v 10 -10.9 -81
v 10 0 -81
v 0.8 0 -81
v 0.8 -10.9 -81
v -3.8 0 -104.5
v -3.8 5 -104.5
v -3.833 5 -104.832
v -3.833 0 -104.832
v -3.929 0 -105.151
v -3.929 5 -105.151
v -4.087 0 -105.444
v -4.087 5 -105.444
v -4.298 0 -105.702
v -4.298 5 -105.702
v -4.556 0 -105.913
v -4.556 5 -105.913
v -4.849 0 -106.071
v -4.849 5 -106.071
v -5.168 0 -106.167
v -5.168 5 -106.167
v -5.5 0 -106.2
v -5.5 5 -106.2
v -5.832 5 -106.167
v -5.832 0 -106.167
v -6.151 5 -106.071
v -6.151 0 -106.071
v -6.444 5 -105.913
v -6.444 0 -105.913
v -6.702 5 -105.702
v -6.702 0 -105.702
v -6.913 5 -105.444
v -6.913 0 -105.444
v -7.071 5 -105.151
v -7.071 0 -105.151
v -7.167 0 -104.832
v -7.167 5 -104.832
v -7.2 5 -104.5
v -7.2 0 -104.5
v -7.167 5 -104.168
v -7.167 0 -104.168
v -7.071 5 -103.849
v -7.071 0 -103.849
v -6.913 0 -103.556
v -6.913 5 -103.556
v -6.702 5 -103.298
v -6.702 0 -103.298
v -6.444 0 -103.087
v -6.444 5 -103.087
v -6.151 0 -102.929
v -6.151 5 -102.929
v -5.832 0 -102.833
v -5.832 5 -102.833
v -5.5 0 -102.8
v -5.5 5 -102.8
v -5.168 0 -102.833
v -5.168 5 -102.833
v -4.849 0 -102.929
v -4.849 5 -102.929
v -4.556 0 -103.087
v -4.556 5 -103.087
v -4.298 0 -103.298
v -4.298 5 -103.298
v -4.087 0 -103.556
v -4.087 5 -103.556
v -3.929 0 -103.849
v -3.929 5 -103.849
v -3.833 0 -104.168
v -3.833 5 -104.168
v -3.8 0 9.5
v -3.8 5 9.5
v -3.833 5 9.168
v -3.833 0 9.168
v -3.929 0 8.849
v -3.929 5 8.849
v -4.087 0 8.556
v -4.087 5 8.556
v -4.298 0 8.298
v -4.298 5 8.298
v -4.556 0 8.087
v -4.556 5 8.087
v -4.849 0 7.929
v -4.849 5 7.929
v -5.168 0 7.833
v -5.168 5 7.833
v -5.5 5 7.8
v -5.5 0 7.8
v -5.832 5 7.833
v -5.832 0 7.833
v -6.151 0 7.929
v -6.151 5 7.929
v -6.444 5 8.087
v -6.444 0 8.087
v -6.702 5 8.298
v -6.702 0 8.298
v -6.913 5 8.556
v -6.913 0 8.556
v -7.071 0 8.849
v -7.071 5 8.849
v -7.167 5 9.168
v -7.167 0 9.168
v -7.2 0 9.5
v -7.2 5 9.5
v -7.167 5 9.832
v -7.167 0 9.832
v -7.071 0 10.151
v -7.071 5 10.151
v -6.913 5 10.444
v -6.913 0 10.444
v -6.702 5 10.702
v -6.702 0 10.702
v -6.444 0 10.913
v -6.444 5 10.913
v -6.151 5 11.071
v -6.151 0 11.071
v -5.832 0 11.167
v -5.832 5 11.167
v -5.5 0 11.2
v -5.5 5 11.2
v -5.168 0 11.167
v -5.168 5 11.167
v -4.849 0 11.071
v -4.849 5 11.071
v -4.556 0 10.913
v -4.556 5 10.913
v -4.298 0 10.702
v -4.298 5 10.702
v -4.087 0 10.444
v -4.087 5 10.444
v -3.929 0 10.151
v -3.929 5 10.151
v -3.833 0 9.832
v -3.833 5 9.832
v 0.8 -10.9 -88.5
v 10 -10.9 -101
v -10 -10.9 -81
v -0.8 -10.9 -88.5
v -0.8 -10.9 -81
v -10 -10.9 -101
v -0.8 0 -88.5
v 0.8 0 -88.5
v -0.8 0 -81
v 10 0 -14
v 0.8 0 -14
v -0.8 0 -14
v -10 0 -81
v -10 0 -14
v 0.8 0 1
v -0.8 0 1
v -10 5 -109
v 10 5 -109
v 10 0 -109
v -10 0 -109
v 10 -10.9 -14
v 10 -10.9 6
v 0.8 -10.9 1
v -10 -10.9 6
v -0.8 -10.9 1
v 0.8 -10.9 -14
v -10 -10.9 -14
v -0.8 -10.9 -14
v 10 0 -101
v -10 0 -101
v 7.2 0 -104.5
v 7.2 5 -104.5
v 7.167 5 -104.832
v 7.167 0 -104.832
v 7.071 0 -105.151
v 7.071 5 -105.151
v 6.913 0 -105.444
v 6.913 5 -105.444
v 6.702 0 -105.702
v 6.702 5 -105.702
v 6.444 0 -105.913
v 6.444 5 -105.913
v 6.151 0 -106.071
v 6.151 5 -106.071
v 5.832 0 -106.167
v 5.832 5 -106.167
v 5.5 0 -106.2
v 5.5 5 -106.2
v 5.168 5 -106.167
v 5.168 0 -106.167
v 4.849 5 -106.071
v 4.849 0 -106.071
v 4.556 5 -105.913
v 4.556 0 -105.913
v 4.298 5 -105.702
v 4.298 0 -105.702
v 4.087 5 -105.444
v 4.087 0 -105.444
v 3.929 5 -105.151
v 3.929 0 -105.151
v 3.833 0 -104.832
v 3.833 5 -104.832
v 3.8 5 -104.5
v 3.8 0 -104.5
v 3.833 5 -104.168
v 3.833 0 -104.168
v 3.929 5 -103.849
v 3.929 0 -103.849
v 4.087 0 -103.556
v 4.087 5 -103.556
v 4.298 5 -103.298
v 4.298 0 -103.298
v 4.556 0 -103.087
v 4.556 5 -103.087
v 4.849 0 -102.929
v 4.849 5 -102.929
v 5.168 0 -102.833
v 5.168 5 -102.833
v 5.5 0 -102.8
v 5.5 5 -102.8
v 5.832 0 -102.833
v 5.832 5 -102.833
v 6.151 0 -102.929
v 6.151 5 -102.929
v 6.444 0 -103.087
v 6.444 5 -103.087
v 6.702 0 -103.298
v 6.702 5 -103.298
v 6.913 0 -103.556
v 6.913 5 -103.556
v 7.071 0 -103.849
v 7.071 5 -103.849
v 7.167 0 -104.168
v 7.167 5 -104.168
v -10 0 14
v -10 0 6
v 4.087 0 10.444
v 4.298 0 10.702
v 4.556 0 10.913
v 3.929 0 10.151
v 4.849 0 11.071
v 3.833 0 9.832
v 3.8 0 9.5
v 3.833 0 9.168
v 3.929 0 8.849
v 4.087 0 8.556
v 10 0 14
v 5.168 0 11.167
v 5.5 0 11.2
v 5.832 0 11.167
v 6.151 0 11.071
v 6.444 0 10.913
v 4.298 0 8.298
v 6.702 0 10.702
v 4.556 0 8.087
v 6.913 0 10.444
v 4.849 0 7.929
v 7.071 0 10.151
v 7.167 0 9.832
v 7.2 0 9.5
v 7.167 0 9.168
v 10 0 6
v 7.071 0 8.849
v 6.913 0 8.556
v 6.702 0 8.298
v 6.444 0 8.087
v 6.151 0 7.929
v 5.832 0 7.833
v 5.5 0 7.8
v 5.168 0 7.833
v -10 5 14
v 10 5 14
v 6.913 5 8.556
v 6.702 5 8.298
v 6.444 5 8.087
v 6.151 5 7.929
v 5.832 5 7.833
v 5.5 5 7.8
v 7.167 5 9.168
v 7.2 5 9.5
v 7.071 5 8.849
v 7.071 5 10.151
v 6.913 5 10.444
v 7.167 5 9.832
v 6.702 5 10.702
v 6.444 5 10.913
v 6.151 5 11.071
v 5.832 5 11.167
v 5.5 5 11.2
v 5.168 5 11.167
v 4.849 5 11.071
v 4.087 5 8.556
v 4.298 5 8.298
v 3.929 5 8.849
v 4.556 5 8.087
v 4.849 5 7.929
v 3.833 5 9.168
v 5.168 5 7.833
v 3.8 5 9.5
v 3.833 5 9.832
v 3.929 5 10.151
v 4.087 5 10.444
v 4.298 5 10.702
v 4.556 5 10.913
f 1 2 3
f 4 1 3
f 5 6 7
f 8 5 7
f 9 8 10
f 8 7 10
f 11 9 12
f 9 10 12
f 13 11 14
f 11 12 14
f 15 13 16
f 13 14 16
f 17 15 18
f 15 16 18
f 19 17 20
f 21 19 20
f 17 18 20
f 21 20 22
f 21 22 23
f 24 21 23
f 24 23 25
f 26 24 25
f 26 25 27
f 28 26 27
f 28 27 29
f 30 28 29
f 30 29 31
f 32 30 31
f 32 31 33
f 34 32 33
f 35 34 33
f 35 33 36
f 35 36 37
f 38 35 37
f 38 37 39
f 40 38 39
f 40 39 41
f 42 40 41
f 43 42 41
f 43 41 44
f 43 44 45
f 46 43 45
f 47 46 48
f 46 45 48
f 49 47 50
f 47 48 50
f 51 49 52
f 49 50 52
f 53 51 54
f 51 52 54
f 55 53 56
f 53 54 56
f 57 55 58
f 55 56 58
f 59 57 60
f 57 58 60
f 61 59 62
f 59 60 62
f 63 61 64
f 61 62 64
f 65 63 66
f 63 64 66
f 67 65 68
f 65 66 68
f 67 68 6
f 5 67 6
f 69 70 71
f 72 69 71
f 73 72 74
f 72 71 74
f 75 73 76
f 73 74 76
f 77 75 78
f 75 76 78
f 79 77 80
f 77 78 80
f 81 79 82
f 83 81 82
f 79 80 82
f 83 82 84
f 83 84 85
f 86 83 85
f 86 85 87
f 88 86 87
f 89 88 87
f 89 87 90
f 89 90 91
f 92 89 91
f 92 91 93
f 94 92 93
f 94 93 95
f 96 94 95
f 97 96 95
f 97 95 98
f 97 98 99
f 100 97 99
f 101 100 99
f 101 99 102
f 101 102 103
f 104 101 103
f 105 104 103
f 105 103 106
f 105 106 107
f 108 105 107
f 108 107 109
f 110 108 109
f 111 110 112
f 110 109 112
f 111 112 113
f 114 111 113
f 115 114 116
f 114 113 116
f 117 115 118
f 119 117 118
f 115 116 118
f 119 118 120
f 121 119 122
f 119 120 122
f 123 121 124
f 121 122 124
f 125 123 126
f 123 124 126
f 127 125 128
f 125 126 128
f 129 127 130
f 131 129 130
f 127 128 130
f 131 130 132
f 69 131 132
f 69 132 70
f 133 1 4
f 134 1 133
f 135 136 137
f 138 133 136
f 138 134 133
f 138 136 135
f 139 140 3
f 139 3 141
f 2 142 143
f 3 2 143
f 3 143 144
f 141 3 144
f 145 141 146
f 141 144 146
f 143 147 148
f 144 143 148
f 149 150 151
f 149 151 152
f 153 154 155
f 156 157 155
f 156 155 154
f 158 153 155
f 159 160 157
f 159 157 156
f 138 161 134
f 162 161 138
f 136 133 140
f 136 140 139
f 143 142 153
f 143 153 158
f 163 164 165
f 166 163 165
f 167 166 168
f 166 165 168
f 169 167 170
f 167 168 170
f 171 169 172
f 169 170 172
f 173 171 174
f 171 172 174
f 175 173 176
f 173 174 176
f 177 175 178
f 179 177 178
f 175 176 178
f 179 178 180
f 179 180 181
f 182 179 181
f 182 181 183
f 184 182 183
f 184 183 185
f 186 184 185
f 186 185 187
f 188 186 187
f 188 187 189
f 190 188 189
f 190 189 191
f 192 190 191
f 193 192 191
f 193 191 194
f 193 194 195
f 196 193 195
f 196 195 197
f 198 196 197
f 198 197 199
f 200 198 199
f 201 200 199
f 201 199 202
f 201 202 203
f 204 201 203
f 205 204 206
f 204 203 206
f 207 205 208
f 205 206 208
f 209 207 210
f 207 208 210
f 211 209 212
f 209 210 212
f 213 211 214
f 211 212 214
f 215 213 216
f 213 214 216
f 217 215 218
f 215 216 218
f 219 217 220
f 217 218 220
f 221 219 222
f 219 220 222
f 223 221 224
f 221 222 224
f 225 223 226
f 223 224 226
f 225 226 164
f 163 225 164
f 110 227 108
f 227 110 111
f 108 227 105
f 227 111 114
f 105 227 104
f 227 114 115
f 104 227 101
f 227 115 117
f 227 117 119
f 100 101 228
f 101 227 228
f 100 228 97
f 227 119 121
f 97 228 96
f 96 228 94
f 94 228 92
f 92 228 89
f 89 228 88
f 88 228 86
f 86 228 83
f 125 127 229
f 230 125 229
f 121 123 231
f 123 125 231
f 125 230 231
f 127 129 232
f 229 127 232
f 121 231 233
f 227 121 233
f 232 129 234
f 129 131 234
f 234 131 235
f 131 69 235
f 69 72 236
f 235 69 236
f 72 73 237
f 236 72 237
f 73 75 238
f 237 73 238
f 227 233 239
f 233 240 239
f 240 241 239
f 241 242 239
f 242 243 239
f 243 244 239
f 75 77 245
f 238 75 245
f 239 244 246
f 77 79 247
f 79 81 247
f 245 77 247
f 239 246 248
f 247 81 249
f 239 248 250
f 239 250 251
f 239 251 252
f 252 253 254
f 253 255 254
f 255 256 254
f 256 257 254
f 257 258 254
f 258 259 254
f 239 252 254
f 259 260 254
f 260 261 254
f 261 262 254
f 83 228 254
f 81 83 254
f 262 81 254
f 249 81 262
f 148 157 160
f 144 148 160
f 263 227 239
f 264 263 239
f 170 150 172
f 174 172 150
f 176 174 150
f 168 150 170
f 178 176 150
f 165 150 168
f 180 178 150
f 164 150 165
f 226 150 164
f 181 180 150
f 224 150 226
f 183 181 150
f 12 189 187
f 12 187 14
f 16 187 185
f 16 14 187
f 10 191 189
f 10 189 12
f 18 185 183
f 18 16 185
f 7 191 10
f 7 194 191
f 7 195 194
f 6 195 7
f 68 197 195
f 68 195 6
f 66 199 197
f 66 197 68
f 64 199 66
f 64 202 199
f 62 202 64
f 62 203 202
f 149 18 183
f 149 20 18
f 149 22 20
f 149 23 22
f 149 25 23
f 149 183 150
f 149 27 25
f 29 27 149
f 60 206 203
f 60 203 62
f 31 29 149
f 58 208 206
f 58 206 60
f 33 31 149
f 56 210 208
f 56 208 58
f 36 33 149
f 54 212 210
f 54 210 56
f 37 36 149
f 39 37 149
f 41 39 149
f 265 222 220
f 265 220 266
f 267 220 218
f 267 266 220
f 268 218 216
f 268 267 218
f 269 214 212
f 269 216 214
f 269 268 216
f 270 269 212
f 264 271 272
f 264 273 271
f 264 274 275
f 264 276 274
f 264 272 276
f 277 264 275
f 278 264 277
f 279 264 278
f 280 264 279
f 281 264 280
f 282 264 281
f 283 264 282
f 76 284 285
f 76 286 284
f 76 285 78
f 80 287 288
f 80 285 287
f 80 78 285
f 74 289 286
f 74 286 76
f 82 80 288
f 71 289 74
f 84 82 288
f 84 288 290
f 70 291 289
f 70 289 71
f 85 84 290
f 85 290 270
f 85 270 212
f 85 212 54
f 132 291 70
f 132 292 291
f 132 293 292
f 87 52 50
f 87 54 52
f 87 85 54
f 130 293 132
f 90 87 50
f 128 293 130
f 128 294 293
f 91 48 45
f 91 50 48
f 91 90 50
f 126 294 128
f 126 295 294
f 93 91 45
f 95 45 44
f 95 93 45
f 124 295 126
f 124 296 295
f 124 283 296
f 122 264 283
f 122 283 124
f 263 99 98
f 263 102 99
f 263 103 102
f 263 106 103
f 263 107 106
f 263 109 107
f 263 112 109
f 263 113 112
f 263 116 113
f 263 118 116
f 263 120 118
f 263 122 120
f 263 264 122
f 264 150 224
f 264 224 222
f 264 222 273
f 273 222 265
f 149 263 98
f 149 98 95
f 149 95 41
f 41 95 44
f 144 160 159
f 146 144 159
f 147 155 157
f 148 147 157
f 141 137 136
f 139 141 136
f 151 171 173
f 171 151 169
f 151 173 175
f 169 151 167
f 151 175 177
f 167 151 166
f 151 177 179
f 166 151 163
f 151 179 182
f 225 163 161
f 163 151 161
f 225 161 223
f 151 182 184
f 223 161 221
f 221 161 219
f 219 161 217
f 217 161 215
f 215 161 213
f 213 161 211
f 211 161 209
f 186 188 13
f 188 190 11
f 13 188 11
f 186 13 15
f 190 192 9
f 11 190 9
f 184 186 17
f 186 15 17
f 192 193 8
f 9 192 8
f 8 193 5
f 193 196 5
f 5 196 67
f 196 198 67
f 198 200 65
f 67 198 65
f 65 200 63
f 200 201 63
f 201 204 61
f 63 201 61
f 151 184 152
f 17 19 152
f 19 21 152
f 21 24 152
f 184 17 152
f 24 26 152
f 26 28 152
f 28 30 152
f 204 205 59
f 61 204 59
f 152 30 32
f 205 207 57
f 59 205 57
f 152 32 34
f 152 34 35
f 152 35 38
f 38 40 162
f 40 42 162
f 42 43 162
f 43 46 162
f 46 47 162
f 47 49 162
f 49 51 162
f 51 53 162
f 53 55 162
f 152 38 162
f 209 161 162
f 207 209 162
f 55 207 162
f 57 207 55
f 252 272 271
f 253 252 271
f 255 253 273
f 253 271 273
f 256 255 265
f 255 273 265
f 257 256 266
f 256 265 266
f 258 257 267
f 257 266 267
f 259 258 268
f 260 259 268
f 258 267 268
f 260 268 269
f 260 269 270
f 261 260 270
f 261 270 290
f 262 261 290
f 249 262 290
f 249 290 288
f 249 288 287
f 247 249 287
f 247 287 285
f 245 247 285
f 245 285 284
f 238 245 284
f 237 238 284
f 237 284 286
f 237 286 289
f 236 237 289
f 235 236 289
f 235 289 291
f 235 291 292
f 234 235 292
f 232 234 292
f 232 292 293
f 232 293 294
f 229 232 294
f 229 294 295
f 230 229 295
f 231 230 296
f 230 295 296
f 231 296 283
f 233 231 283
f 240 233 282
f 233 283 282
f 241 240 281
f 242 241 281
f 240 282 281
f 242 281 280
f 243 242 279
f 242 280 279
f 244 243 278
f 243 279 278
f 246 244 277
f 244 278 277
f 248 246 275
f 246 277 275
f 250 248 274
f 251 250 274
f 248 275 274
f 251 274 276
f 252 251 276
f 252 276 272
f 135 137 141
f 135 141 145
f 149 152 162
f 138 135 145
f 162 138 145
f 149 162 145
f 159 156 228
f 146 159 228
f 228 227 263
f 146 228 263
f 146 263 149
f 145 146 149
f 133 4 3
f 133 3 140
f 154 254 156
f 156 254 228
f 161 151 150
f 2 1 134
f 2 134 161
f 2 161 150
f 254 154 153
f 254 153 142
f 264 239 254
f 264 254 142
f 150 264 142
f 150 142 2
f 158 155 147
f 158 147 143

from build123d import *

# Parameters (mm, degrees)
SKETCH1_W            = 20
SKETCH1_H            = 28
BOSS_EXTRUDE1_DEPTH  = 5
SKETCH2_W            = 20
SKETCH2_H            = 20
BOSS_EXTRUDE2_DEPTH  = 10.9
SKETCH3_W            = 1.6
SKETCH3_H            = 15
CUT_EXTRUDE1_DEPTH   = 10.9
M3_CLEARANCE_HOLE1_D = 3.4
SKETCH6_W            = 20
SKETCH6_H            = 5
BOSS_EXTRUDE3_DEPTH  = 87
SKETCH7_W            = 20
SKETCH7_H            = 5
BOSS_EXTRUDE4_DEPTH  = 8
SKETCH8_W            = 20
SKETCH8_H            = 20
BOSS_EXTRUDE5_DEPTH  = 10.9
SKETCH9_W            = 1.6
SKETCH9_H            = 28.5
CUT_EXTRUDE2_DEPTH   = 10.9
M3_CLEARANCE_HOLE2_D = 3.4


with BuildPart() as part:
    # Sketch1 → Boss-Extrude1 (new body)
    with BuildSketch(Plane(origin=(0, 0, 0), x_dir=(1, 0, 0), z_dir=(0, 1, 0))):
        Rectangle(SKETCH1_W, SKETCH1_H)
    extrude(amount=BOSS_EXTRUDE1_DEPTH)

    # Sketch2 → Boss-Extrude2 (add)
    with BuildSketch(Plane(origin=(0, 0, 0), x_dir=(-1, 0, 0), z_dir=(0, -1, 0))):
        with Locations((0, 4)):
            Rectangle(SKETCH2_W, SKETCH2_H)
    extrude(amount=BOSS_EXTRUDE2_DEPTH)

    # Sketch3 → Cut-Extrude1 (cut)
    with BuildSketch(Plane(origin=(0, -10.9, 0), x_dir=(-1, 0, 0), z_dir=(0, -1, 0))):
        with Locations((0, 6.5)):
            Rectangle(SKETCH3_W, SKETCH3_H)
    extrude(amount=-CUT_EXTRUDE1_DEPTH, mode=Mode.SUBTRACT)

    # M3 Clearance Hole1 (through all)
    with Locations(Plane(origin=(0, 0, 0), x_dir=(-1, 0, 0), z_dir=(0, -1, 0))):
        with Locations((-5.5, -9.5), (5.5, -9.5)):
            Hole(M3_CLEARANCE_HOLE1_D / 2)

    # Sketch6 → Boss-Extrude3 (add)
    with BuildSketch(Plane(origin=(0, 0, -14), x_dir=(-1, 0, 0), z_dir=(0, 0, -1))):
        with Locations((0, 2.5)):
            Rectangle(SKETCH6_W, SKETCH6_H)
    extrude(amount=BOSS_EXTRUDE3_DEPTH)

    # Sketch7 → Boss-Extrude4 (add)
    with BuildSketch(Plane(origin=(0, 0, -101), x_dir=(-1, 0, 0), z_dir=(0, 0, -1))):
        with Locations((0, 2.5)):
            Rectangle(SKETCH7_W, SKETCH7_H)
    extrude(amount=BOSS_EXTRUDE4_DEPTH)

    # Sketch8 → Boss-Extrude5 (add)
    with BuildSketch(Plane(origin=(0, 0, 0), x_dir=(-1, 0, 0), z_dir=(0, -1, 0))):
        with Locations((0, 91)):
            Rectangle(SKETCH8_W, SKETCH8_H)
    extrude(amount=BOSS_EXTRUDE5_DEPTH)

    # Sketch9 → Cut-Extrude2 (cut)
    with BuildSketch(Plane(origin=(0, -10.9, 0), x_dir=(-1, 0, 0), z_dir=(0, -1, 0))):
        with Locations((0, 74.25)):
            Rectangle(SKETCH9_W, SKETCH9_H)
    extrude(amount=-CUT_EXTRUDE2_DEPTH, mode=Mode.SUBTRACT)

    # M3 Clearance Hole2 (through all)
    with Locations(Plane(origin=(0, 0, 0), x_dir=(-1, 0, 0), z_dir=(0, -1, 0))):
        with Locations((-5.5, 104.5), (5.5, 104.5)):
            Hole(M3_CLEARANCE_HOLE2_D / 2)


solid = part.part
